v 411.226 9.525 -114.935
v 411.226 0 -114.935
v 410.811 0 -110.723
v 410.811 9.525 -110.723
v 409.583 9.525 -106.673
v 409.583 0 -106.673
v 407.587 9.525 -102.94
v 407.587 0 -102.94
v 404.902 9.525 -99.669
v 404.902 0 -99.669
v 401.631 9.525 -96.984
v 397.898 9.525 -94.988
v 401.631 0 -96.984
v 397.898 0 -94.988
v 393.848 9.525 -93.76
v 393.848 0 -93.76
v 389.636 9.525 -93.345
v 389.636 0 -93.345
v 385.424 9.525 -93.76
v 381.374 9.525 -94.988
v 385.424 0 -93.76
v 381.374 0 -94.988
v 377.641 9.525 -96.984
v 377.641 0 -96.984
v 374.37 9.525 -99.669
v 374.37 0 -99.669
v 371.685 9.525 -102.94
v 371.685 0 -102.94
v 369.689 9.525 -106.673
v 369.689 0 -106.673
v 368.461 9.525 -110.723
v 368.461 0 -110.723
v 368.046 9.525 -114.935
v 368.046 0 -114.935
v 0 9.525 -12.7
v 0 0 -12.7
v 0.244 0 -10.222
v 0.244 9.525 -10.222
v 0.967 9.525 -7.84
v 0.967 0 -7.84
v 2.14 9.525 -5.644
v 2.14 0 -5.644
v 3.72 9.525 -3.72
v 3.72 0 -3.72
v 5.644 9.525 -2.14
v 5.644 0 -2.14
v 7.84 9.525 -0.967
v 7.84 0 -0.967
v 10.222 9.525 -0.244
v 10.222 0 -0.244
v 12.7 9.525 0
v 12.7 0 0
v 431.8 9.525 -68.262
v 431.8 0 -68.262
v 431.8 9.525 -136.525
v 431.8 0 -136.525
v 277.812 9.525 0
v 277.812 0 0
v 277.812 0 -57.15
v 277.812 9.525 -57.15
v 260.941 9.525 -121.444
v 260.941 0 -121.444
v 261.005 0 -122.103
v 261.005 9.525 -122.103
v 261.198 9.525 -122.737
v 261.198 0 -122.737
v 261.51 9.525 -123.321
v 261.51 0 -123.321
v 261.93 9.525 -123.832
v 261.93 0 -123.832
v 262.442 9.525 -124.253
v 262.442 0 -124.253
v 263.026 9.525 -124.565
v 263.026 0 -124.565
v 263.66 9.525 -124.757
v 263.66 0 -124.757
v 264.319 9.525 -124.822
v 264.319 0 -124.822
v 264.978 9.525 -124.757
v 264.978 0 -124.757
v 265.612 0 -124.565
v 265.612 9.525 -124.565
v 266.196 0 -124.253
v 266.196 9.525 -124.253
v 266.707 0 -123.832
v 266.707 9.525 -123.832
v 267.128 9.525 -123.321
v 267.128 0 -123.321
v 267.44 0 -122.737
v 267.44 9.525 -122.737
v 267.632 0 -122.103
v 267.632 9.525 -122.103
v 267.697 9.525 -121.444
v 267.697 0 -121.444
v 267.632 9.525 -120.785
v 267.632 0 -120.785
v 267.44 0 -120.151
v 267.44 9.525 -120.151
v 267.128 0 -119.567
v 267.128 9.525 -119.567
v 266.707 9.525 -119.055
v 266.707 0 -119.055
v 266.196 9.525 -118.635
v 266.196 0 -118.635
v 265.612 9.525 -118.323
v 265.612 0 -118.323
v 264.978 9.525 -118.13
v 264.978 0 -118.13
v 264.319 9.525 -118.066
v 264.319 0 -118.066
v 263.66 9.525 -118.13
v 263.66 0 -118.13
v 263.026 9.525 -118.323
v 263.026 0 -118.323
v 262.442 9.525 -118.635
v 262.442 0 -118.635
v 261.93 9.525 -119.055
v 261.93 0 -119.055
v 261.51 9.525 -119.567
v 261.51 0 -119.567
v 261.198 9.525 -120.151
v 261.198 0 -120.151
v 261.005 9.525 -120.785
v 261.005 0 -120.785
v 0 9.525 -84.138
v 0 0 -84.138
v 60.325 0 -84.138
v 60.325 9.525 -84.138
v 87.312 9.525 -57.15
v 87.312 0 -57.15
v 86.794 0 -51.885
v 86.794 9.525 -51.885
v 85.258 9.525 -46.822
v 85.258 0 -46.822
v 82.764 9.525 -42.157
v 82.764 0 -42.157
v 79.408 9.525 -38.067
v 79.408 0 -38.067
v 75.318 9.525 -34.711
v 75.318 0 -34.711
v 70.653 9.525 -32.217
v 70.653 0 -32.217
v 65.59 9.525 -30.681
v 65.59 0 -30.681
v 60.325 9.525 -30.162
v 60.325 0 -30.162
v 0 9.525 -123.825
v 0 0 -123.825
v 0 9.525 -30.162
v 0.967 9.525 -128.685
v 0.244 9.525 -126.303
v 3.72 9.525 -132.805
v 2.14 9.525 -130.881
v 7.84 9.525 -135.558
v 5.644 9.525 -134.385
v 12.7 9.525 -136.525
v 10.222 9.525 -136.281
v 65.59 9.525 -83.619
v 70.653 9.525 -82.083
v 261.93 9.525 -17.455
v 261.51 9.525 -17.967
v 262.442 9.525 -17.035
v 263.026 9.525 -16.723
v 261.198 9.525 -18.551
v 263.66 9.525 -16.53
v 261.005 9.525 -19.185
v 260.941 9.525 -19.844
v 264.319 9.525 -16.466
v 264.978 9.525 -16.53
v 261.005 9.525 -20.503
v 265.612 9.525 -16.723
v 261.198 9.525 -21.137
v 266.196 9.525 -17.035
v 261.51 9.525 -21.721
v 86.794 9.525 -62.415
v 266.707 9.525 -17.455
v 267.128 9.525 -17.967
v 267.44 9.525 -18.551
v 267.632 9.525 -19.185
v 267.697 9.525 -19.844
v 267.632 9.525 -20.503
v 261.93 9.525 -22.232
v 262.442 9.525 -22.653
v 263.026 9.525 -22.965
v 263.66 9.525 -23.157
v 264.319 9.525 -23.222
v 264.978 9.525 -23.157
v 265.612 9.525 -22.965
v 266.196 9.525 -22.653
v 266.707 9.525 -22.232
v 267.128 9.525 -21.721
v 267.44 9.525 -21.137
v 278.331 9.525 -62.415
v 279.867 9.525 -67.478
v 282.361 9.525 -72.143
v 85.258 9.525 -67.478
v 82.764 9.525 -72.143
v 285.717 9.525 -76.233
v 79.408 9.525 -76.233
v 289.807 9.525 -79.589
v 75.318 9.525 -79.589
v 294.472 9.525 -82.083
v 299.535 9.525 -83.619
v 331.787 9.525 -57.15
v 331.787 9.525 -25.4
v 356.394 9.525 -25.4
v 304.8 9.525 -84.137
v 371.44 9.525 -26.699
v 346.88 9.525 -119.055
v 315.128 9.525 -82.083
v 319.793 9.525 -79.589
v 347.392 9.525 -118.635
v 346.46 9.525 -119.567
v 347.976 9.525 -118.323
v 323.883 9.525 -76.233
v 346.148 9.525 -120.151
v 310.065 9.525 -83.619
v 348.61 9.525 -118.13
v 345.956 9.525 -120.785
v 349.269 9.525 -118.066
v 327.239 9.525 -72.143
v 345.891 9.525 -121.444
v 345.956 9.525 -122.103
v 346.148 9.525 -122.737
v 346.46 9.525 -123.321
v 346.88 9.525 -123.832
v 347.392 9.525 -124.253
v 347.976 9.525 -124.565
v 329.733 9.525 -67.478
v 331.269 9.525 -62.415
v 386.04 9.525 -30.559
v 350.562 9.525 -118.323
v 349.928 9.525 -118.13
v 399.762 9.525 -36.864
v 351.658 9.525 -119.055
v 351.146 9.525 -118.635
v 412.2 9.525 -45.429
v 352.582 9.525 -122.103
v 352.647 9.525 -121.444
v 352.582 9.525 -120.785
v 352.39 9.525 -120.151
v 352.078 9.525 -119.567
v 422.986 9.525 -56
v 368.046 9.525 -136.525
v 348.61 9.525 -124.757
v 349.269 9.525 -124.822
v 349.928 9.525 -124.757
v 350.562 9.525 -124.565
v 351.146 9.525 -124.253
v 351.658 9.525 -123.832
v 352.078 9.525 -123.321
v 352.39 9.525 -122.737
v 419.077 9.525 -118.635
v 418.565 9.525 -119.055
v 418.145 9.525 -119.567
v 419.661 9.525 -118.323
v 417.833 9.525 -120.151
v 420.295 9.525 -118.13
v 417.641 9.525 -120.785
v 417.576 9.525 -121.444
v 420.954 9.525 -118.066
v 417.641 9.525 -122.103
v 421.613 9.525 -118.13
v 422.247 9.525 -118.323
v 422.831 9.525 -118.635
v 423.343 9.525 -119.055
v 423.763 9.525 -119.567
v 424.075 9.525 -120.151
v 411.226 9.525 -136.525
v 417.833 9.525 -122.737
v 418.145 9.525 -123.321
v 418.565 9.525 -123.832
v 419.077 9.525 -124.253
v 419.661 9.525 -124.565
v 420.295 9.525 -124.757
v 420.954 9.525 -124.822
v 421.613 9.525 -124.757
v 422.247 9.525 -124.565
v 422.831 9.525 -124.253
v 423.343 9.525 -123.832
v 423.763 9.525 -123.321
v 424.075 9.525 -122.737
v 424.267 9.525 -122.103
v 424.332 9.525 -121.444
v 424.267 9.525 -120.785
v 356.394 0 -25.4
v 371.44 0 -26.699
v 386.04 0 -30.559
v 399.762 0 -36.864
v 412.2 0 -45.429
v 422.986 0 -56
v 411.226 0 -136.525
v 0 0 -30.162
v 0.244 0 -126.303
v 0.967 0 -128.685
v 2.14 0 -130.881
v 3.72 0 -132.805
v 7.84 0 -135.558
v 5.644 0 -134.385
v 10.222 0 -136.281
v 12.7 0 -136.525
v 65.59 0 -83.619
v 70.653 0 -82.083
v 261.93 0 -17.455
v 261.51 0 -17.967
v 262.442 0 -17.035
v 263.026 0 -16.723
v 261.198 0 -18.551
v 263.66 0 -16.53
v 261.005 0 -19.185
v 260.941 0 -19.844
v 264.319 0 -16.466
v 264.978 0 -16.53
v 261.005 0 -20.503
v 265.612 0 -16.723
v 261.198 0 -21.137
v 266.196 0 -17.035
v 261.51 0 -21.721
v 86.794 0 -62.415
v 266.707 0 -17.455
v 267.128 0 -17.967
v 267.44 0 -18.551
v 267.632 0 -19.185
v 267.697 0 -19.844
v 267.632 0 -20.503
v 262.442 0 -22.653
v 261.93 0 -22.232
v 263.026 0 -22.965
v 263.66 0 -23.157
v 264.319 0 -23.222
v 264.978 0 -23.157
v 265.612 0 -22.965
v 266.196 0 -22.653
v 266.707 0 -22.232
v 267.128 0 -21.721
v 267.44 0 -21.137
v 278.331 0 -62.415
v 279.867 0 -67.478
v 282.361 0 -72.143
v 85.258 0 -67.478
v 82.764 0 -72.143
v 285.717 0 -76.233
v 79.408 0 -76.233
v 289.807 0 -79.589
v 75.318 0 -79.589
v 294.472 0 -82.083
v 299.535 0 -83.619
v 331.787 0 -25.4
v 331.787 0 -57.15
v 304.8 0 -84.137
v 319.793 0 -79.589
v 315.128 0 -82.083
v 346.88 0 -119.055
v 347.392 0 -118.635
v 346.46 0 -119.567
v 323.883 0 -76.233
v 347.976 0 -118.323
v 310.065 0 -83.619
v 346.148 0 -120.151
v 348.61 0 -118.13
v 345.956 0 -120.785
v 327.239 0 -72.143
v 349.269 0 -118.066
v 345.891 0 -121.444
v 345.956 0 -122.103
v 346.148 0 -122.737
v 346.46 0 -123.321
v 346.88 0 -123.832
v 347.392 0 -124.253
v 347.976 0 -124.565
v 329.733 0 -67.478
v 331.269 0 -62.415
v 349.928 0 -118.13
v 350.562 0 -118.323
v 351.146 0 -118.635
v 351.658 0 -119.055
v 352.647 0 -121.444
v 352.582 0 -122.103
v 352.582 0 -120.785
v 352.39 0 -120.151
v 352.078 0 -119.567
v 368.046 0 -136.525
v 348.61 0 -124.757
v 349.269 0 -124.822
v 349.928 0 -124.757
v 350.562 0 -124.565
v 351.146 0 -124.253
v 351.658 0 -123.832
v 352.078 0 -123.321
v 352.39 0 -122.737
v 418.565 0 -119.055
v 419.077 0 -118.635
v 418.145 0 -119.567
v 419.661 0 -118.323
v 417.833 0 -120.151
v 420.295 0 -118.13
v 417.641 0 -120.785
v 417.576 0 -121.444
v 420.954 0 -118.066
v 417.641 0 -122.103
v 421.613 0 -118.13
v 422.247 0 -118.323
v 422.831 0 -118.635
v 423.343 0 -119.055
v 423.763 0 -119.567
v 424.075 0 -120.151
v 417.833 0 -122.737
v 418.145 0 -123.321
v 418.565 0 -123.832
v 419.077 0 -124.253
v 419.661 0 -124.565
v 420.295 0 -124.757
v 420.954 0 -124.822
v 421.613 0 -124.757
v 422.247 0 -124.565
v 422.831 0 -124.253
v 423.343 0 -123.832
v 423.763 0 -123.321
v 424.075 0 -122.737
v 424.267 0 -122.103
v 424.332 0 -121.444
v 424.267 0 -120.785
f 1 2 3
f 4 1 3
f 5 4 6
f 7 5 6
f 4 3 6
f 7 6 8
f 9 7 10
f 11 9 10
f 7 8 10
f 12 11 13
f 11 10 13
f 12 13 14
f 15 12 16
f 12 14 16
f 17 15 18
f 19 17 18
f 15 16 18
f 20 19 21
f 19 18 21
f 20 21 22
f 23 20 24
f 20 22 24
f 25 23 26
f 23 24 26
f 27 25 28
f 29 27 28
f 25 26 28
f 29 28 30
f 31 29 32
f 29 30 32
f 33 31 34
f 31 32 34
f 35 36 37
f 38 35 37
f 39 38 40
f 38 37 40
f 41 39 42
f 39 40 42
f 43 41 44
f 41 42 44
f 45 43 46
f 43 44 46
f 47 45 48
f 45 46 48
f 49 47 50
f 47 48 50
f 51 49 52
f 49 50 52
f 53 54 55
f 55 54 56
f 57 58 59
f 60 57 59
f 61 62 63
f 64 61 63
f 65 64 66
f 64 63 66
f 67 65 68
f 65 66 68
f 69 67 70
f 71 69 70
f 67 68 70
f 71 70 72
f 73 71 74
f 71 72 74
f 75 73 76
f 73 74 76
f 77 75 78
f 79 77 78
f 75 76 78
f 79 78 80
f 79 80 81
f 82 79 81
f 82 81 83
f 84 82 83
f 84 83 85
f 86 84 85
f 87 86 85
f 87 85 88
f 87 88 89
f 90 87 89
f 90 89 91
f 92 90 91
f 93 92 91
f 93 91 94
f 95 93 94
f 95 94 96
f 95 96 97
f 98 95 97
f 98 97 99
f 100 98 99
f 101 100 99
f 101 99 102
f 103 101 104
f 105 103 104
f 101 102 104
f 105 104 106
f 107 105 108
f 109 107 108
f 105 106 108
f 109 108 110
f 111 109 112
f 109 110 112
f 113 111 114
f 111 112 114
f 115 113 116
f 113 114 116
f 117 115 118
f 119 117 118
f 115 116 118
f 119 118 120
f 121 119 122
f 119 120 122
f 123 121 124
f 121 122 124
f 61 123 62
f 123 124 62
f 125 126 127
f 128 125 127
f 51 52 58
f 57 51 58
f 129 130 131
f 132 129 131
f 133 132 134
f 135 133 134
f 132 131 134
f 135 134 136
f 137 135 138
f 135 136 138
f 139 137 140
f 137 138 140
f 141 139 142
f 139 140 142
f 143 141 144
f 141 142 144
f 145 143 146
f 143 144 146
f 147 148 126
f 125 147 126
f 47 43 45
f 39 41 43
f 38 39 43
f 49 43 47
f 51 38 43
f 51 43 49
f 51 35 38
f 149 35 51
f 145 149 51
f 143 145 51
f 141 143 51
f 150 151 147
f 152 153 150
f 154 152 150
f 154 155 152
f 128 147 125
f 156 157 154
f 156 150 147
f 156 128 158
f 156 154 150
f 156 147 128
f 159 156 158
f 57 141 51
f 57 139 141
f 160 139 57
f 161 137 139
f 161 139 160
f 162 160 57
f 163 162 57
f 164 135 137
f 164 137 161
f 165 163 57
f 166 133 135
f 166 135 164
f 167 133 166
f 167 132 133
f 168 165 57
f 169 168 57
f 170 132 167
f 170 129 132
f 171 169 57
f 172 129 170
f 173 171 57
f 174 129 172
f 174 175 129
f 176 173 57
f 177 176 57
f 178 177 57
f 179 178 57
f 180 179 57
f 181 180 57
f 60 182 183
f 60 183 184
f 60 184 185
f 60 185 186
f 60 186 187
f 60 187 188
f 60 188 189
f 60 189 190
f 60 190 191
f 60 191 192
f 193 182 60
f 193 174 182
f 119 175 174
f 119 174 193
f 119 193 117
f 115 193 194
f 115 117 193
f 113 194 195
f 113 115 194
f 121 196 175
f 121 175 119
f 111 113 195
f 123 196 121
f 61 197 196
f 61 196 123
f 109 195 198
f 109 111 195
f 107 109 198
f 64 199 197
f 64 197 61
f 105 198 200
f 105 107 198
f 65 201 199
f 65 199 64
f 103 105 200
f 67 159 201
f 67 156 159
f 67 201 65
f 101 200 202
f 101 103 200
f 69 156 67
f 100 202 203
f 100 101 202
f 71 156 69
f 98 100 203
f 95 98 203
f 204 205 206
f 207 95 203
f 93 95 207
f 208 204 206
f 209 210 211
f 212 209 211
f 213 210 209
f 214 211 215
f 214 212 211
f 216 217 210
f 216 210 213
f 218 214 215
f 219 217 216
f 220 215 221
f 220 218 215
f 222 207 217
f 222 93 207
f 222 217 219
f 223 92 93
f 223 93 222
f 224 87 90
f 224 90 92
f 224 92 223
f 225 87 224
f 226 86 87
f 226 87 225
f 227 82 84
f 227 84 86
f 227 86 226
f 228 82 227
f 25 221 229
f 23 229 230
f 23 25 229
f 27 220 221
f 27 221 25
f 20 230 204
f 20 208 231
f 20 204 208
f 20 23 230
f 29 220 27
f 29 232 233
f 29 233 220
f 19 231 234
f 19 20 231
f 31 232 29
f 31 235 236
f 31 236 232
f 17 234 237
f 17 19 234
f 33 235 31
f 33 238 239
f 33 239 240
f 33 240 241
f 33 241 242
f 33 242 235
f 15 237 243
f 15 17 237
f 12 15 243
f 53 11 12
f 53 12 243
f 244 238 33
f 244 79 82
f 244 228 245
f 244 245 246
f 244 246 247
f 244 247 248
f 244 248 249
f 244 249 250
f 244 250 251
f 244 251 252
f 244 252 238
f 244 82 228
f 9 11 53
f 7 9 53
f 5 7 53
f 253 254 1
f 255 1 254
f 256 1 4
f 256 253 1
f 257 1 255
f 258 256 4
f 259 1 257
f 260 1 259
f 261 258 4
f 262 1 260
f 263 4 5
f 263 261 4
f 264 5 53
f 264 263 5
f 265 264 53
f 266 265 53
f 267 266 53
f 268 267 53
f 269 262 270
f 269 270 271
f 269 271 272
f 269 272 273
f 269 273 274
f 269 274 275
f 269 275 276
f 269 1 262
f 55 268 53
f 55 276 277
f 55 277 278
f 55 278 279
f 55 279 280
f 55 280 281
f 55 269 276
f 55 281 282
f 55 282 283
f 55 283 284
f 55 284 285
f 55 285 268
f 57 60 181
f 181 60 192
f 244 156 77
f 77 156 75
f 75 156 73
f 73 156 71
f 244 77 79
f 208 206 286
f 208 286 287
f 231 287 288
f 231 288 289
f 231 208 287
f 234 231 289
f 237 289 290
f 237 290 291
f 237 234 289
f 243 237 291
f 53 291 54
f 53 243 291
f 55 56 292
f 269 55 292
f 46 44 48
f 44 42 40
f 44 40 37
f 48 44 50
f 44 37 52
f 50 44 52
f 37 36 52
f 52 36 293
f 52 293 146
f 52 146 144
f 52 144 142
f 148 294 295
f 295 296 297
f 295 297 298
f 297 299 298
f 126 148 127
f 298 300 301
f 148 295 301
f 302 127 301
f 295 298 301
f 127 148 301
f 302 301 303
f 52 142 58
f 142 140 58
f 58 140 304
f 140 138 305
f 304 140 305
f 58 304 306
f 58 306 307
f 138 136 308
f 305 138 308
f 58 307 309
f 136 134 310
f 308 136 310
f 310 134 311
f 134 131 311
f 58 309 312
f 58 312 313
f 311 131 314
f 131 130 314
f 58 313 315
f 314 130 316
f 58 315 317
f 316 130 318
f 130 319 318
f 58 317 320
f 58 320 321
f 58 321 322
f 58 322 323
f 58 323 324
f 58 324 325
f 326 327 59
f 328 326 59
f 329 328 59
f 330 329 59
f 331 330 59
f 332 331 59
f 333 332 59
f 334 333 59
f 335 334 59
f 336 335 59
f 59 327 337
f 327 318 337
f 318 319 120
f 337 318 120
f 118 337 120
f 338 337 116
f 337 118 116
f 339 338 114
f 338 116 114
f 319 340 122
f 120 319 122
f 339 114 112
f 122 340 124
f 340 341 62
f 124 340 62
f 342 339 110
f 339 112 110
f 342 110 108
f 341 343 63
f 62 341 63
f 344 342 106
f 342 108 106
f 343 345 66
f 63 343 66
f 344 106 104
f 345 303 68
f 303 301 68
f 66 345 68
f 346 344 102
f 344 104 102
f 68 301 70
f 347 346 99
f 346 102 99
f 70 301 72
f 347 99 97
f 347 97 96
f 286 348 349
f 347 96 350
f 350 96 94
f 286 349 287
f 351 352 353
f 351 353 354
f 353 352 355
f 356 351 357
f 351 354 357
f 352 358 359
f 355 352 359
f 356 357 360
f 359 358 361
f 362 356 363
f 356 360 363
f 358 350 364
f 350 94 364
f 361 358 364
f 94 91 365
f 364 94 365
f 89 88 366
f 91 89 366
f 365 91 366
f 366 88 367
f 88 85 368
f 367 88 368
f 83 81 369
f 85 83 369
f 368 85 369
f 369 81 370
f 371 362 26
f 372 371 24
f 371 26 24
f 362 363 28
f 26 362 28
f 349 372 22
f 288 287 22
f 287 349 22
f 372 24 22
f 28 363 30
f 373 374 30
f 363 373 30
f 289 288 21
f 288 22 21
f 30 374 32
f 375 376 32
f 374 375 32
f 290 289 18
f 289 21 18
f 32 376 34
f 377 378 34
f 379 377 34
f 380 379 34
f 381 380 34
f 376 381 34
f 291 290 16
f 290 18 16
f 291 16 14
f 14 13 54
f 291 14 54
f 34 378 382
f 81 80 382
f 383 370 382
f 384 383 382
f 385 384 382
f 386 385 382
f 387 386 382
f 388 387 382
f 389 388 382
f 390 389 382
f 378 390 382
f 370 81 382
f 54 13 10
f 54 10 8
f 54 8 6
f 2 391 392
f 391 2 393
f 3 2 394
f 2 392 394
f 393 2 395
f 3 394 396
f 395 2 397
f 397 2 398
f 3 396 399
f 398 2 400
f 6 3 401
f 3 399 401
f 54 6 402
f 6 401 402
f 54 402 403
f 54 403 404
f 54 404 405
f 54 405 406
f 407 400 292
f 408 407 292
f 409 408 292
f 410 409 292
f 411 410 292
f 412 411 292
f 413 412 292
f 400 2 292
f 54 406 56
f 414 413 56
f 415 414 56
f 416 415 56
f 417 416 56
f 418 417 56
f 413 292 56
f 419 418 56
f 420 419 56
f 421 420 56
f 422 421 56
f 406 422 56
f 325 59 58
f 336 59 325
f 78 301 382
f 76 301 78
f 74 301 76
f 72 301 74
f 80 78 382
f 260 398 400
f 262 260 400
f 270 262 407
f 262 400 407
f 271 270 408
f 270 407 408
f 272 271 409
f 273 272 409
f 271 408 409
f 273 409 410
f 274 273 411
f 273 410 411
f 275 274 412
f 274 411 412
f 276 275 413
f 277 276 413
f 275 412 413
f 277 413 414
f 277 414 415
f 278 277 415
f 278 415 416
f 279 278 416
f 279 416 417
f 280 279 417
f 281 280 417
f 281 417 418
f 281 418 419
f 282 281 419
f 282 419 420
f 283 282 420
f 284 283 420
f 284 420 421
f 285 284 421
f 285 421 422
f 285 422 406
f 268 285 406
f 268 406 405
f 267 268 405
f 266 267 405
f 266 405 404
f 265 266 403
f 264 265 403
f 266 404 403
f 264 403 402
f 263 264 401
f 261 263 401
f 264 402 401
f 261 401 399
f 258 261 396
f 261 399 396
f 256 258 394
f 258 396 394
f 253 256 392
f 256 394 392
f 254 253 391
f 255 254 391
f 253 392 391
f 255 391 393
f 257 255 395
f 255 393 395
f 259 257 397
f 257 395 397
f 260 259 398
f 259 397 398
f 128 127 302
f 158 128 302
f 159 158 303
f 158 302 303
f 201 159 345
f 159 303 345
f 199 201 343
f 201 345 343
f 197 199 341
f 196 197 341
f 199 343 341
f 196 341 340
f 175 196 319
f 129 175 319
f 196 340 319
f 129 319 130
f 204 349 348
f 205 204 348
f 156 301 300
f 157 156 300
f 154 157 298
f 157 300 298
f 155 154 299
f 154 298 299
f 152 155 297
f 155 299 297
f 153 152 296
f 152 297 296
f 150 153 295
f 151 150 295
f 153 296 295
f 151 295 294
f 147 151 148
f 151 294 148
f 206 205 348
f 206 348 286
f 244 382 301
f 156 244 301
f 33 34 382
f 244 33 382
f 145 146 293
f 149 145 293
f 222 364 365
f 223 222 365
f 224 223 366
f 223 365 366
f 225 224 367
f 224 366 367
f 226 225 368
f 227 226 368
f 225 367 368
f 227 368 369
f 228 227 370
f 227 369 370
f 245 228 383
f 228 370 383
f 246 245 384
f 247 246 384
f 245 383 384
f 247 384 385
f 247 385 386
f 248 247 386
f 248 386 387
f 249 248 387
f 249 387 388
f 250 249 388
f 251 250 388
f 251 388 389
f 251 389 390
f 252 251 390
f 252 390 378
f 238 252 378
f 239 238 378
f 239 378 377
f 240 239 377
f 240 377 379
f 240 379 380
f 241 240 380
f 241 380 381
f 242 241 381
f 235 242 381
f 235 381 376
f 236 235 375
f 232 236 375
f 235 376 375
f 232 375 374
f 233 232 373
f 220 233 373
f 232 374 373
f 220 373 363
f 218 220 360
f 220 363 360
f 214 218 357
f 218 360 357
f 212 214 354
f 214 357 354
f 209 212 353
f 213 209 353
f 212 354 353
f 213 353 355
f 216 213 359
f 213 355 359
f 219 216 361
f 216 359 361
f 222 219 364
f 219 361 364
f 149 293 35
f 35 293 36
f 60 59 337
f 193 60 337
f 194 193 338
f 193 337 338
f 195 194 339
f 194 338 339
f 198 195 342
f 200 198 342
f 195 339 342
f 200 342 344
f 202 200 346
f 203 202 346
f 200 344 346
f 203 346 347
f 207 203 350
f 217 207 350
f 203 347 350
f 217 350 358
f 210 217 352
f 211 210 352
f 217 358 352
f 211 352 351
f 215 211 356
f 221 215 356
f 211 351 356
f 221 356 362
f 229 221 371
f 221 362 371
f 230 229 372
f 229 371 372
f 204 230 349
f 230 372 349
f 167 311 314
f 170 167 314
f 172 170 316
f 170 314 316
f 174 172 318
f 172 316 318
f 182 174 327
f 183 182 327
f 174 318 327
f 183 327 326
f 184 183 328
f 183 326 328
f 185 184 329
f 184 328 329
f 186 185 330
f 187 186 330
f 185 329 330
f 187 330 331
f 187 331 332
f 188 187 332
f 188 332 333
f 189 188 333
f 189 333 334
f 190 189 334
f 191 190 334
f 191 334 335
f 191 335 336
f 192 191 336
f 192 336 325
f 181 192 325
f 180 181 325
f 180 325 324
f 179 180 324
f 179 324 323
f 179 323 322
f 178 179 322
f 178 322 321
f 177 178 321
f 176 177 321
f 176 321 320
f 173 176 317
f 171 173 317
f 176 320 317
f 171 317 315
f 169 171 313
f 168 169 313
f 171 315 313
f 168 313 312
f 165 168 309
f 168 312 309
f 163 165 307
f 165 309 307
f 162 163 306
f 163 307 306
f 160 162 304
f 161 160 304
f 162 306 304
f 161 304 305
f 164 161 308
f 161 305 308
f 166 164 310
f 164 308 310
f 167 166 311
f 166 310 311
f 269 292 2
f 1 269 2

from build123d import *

# Parameters (mm, degrees)
BOSS_EXTRUDE2_DEPTH     = 9.525
CUT_EXTRUDE2_DEPTH      = 453.969139401
F_1_4_CLEARANCE_HOLE1_D = 6.7564


with BuildPart() as part:
    # Sketch1 → Boss-Extrude2 (new body)
    with BuildSketch(Plane(origin=(0, 0, 0), x_dir=(1, 0, 0), z_dir=(0, 1, 0))):
        with BuildLine():
            Line((25.4, 0), (277.8125, 0))
            Line((277.8125, 0), (277.8125, 57.15))
            ThreePointArc((277.8125, 57.15), (304.8, 84.1375), (331.78749993, 57.15))
            Line((331.78749993, 57.15), (331.78749993, 0))
            Line((331.78749993, 0), (357.18749993, 0))
            ThreePointArc((357.18749993, 0), (407.751306336, 19.640432558), (431.8, 68.2625))
            Line((431.8, 68.2625), (431.8, 136.525))
            Line((431.8, 136.525), (411.226, 136.525))
            Line((411.226, 136.525), (411.226, 114.935))
            ThreePointArc((411.226, 114.935), (389.636, 93.345), (368.046, 114.935))
            Line((368.046, 114.935), (368.046, 136.525))
            Line((368.046, 136.525), (23.8125, 136.525))
            Line((23.8125, 136.525), (12.7, 136.525))
            ThreePointArc((12.7, 136.525), (3.719743879, 132.805256121), (0, 123.825))
            Line((0, 123.825), (0, 96.8375))
            Line((0, 96.8375), (0, 84.1375))
            Line((0, 84.1375), (22.225, 84.1375))
            Line((22.225, 84.1375), (60.325, 84.1375))
            ThreePointArc((60.325, 84.1375), (79.408044257, 76.233044257), (87.3125, 57.15))
            ThreePointArc((87.3125, 57.15), (79.408044257, 38.066955743), (60.325, 30.1625))
            Line((60.325, 30.1625), (22.225, 30.1625))
            Line((22.225, 30.1625), (0, 30.1625))
            Line((0, 30.1625), (0, 17.4625))
            Line((0, 17.4625), (0, 12.7))
            ThreePointArc((0, 12.7), (3.719743879, 3.719743879), (12.7, 0))
            Line((12.7, 0), (25.4, 0))
        make_face()
    extrude(amount=BOSS_EXTRUDE2_DEPTH)

    # Sketch2 → Cut-Extrude2 (cut, through all)
    with BuildSketch(Plane(origin=(0, 9.525, 0), x_dir=(1, 0, 0), z_dir=(0, 1, 0))):
        with BuildLine():
            Line((331.78749993, 0), (331.78749993, 25.4))
            Line((331.78749993, 25.4), (356.39375, 25.4))
            ThreePointArc((356.39375, 25.4), (399.762219091, 36.86444095), (431.8, 68.2625))
            ThreePointArc((431.8, 68.2625), (407.751306336, 19.640432558), (357.18749993, 0))
            Line((357.18749993, 0), (331.78749993, 0))
        make_face()
    extrude(amount=-CUT_EXTRUDE2_DEPTH, mode=Mode.SUBTRACT)

    # 1/4 Clearance Hole1 (through all)
    with Locations(Plane(origin=(0, 9.525, 0), x_dir=(1, 0, 0), z_dir=(0, 1, 0))):
        with Locations((420.9542, 121.44375), (349.26905, 121.44375), (264.318750035, 121.44375), (264.318750035, 19.84375)):
            Hole(F_1_4_CLEARANCE_HOLE1_D / 2)


solid = part.part
